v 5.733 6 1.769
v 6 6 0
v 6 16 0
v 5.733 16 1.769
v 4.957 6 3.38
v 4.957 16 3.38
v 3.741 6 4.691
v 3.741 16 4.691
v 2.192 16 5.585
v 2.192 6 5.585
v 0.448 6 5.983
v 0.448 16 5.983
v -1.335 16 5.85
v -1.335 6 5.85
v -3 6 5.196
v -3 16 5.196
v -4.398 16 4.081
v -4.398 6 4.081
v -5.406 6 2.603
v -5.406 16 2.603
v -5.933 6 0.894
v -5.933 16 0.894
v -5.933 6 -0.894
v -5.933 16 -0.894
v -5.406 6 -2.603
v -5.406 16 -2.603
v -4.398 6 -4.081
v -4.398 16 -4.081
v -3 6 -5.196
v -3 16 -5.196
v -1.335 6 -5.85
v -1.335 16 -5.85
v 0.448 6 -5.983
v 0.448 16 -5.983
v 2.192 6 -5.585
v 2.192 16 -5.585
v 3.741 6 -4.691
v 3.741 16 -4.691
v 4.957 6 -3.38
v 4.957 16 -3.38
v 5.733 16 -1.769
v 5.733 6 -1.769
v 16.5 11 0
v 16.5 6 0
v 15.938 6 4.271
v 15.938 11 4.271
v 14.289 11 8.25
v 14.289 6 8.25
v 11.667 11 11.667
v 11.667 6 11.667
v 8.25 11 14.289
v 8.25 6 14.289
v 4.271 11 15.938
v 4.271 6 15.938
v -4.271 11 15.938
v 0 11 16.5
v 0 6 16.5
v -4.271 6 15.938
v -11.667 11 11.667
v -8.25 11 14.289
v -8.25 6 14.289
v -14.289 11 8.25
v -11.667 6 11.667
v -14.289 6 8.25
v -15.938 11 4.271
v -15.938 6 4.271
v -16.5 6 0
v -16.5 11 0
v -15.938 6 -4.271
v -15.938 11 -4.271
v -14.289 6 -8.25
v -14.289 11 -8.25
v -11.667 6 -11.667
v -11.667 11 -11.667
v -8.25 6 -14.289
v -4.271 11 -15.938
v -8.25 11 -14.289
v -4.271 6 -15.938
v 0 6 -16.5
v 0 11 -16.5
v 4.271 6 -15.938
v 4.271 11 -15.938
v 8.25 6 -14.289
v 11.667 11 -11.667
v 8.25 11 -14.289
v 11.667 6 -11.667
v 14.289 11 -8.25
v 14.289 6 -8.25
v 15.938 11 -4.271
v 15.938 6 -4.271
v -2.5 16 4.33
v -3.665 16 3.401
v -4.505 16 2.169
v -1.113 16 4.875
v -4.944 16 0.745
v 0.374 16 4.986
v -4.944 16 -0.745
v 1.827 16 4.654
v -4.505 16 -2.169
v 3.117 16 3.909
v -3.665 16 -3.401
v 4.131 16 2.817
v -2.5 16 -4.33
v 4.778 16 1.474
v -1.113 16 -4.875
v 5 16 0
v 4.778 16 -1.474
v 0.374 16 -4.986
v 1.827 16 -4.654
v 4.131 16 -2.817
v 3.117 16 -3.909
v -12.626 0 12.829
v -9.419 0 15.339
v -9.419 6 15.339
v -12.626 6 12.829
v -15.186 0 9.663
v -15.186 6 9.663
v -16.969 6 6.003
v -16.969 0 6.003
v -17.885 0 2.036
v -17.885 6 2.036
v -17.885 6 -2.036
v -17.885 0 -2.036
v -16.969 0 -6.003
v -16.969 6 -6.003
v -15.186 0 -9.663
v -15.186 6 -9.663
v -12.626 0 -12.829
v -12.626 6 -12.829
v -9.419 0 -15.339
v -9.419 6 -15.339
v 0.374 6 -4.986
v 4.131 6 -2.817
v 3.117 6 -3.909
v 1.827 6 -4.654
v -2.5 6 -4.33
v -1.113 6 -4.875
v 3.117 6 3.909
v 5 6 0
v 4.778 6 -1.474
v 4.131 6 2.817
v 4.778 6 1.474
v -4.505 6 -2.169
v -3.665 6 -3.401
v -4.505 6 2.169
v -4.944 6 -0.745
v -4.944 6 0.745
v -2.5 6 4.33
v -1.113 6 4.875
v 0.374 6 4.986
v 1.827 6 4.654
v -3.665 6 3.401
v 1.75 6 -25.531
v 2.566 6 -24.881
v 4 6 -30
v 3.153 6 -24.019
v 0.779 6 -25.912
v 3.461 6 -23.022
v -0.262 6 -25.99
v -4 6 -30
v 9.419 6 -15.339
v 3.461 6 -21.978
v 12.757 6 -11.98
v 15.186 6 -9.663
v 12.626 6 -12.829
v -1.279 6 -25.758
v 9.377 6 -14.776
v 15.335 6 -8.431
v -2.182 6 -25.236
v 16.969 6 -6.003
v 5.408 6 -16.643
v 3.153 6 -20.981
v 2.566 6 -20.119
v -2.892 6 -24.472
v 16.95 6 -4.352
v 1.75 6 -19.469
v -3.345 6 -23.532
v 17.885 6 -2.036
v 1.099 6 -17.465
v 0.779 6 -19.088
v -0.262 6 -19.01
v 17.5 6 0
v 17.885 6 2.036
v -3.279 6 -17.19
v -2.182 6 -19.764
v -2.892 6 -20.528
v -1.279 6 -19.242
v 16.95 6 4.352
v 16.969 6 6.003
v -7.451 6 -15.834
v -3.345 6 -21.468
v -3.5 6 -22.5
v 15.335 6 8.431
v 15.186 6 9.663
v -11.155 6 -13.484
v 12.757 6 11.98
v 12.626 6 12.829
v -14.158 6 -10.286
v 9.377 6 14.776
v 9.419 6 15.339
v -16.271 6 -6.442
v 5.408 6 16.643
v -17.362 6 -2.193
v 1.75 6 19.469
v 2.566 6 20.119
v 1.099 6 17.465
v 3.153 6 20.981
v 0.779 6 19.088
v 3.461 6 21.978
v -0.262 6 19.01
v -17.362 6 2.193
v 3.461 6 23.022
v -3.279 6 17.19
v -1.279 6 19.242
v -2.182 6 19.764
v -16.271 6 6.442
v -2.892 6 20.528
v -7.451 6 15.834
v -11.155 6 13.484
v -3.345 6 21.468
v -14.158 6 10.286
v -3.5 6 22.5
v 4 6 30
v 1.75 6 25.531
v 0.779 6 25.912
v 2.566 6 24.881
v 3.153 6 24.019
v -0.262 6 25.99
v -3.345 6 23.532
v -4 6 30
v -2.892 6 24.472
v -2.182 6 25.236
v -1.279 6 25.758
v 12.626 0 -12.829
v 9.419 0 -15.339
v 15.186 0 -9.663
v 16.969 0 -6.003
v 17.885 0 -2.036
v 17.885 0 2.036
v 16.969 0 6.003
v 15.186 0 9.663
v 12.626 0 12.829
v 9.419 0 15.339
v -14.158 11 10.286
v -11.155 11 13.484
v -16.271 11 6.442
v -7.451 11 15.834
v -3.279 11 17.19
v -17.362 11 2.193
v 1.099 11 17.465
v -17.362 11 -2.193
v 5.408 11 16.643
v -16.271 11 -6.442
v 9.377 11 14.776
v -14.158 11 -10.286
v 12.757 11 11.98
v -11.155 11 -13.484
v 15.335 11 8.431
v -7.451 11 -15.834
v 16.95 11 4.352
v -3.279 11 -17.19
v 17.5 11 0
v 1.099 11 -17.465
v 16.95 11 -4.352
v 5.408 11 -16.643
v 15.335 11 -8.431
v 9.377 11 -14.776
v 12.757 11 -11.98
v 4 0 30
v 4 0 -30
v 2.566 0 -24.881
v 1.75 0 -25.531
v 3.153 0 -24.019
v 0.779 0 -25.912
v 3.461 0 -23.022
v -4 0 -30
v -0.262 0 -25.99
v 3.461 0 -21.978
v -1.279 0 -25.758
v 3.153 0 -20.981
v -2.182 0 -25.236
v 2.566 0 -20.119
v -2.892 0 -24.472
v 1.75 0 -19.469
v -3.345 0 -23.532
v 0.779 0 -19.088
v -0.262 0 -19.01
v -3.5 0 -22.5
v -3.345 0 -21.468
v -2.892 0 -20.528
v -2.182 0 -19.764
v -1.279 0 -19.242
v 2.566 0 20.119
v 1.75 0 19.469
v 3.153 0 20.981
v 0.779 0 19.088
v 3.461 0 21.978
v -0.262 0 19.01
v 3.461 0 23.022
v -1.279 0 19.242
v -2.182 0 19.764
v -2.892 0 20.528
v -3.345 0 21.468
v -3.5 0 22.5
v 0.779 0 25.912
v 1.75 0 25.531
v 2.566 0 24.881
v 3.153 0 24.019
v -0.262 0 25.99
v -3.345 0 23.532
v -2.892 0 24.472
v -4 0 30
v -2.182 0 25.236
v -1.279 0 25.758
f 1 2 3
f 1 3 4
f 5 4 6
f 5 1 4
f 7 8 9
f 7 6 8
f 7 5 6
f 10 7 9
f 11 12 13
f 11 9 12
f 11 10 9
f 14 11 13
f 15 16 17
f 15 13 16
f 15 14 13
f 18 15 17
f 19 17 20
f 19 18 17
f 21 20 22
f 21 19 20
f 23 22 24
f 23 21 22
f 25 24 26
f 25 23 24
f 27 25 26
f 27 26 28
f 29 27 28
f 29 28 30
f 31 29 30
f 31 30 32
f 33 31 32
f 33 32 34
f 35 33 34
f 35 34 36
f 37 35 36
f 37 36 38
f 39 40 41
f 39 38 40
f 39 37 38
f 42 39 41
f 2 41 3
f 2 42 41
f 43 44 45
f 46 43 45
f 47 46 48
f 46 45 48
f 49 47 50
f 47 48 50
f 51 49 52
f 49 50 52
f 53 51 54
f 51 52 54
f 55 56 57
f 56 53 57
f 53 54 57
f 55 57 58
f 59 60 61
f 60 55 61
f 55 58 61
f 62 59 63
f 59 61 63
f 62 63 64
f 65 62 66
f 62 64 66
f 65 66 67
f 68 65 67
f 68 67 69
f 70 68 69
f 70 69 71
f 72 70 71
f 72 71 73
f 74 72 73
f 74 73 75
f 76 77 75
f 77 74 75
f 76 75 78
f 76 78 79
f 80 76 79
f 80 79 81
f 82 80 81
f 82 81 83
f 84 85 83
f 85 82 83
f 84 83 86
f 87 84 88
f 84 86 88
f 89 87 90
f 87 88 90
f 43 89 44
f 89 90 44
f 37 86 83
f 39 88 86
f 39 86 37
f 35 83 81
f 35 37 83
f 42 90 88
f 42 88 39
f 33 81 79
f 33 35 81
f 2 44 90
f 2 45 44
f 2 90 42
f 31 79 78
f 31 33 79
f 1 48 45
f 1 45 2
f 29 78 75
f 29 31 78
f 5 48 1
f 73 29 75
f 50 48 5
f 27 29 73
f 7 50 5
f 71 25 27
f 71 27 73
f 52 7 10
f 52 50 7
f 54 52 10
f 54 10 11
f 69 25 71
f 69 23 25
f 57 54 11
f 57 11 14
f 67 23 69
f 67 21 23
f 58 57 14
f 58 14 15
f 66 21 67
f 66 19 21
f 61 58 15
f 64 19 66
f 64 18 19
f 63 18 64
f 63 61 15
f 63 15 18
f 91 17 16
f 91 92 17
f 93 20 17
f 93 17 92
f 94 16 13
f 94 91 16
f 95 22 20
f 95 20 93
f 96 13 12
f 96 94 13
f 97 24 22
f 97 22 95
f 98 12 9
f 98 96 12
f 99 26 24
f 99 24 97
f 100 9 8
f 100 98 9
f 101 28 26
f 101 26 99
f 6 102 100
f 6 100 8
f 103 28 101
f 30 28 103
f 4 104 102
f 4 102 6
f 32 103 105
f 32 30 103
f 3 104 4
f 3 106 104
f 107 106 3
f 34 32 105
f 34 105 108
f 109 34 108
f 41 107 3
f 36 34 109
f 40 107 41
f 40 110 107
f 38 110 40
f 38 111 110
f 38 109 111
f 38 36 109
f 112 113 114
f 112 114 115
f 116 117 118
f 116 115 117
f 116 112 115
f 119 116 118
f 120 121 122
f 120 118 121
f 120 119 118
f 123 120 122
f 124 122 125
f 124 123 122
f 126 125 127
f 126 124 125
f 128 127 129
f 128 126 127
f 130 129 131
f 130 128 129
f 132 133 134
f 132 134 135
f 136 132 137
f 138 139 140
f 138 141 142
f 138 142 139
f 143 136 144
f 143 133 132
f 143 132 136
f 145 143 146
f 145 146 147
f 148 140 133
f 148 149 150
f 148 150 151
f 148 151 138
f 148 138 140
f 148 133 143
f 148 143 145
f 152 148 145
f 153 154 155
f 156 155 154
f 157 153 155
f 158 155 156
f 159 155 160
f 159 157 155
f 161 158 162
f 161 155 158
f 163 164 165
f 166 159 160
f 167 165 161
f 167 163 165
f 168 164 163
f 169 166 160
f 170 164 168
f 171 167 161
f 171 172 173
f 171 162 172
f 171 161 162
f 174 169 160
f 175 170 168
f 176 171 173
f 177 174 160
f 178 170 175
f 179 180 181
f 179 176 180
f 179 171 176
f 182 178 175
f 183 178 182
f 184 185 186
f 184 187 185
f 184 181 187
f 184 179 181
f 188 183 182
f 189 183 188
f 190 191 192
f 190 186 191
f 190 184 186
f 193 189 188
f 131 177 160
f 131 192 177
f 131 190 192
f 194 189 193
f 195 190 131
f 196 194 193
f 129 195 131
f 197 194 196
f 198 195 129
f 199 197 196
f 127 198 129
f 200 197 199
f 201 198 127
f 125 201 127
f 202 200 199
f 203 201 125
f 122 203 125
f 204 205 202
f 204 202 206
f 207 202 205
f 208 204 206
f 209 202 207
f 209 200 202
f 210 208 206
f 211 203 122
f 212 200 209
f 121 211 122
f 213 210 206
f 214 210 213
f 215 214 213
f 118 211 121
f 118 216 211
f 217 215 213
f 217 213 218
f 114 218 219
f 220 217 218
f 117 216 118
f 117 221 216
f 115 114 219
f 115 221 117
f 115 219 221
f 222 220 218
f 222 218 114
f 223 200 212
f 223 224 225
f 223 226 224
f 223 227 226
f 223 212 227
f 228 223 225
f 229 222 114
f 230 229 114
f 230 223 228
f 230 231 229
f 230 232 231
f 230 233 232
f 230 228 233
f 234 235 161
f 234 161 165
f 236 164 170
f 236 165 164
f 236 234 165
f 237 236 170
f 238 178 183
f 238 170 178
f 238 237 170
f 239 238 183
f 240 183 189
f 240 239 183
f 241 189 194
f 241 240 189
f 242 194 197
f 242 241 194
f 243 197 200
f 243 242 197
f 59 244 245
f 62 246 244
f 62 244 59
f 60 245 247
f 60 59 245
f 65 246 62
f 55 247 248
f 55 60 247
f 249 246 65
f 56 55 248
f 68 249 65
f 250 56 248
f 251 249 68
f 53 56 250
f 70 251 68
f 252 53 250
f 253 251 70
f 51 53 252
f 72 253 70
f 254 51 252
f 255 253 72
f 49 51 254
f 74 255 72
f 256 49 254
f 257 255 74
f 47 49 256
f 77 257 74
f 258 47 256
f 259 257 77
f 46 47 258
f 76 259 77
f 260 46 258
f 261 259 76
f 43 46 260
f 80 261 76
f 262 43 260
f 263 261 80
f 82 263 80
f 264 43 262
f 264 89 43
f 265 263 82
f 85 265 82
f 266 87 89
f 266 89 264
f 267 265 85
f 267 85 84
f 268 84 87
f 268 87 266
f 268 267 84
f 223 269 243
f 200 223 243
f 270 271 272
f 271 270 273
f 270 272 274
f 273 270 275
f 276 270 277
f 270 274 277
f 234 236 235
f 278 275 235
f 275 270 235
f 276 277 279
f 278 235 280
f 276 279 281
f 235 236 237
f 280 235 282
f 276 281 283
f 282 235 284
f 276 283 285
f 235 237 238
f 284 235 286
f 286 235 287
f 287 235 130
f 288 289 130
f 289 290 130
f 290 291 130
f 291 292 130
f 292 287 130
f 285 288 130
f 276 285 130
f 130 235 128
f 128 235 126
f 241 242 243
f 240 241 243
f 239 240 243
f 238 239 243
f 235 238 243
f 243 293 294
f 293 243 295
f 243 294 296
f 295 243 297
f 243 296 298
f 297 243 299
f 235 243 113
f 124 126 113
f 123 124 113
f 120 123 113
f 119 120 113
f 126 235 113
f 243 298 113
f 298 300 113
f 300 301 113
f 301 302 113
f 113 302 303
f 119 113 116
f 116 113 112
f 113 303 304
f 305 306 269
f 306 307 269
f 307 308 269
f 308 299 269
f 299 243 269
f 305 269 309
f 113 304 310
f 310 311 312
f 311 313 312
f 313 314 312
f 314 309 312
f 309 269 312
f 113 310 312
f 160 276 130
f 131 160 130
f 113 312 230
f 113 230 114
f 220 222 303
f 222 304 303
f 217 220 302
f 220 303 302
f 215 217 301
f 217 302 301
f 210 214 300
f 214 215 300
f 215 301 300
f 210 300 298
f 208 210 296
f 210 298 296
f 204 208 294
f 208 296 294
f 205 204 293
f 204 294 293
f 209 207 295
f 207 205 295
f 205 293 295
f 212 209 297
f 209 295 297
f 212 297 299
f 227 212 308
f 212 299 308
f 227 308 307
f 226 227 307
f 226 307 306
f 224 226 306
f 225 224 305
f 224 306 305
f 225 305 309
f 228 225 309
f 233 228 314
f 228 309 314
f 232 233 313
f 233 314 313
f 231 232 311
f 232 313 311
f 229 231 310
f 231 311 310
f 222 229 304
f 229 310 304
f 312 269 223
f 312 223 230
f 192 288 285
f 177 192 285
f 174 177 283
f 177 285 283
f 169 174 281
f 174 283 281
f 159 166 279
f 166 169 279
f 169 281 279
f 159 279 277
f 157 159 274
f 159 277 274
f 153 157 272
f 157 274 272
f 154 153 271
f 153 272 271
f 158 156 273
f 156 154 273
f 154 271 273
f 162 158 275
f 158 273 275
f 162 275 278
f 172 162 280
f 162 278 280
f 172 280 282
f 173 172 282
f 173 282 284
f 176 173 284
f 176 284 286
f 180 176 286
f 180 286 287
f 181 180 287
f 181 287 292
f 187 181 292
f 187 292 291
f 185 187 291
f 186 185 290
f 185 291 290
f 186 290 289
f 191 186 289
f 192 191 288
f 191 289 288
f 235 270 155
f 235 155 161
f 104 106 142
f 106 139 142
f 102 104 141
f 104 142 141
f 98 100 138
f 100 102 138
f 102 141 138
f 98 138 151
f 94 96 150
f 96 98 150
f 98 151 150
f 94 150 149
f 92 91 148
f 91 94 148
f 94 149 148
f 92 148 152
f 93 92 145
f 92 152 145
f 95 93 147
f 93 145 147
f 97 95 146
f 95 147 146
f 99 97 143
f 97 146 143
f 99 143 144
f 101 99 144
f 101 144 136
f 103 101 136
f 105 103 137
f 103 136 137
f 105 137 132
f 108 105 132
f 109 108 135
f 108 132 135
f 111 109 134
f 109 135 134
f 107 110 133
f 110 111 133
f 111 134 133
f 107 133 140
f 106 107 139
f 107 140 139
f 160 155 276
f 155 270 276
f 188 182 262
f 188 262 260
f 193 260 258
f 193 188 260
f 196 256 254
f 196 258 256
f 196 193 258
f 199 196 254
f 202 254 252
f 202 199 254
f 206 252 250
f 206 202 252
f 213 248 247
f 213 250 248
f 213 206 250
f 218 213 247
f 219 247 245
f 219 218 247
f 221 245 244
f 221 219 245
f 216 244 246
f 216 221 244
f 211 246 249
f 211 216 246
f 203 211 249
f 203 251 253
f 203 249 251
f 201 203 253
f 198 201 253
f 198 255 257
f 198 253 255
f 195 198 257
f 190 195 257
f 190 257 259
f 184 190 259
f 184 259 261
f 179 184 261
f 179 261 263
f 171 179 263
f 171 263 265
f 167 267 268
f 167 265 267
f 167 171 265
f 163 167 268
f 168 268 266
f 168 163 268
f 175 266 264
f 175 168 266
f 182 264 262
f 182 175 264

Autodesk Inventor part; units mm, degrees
ref_plane "YZ Plane" through (0, 0, 0) normal (1, 0, 0) x (0, 1, 0)
ref_plane "XZ Plane" through (0, 0, 0) normal (0, 1, 0) x (-1, 0, 0)
sketch "Sketch1" plane through (0, 0, 0) normal (0, 1, 0) x (-1, 0, 0)
  circle A0 centre (0, 22.5) radius 3.5
  line L0 (0, 30) -> (4, 30)
  line L1 (4, 30) -> (9.4194, 15.3387)
  line L2 (0, 30) -> (-4, 30)
  line L3 (-4, 30) -> (-9.4194, 15.3387)
  circle A1 centre (0, -22.5) radius 3.5
  line L4 (0, -30) -> (4, -30)
  line L5 (4, -30) -> (9.4194, -15.3387)
  line L6 (0, -30) -> (-4, -30)
  line L7 (-4, -30) -> (-9.4194, -15.3387)
  arc A2 (-9.4194, 15.3387) -> (-9.4194, -15.3387) centre (0, 0) ccw
  arc A3 (9.4194, -15.3387) -> (9.4194, 15.3387) centre (0, 0) ccw
extrude "Extrusion1" add sketch "Sketch1" along normal blind 6
ref_plane "Work Plane1" through (0, 6, 0) normal (0, 1, 0) x (1, 0, 0)
sketch "Sketch2" plane through (0, 6, 0) normal (0, 1, 0) x (1, 0, 0)
  circle A0 centre (0, 0) radius 17.5
  circle A1 centre (0, 0) radius 16.5
  dimension "d9" = 35
  dimension "d12" = 33
extrude "Extrusion2" add sketch "Sketch2" along normal blind 5
sketch "Sketch3" plane through (0, 6, 0) normal (0, 1, 0) x (1, 0, 0)
  circle A0 centre (0, 0) radius 5
  circle A1 centre (0, 0) radius 6
  dimension "d15" = 10
  dimension "d16" = 12
extrude "Extrusion3" add sketch "Sketch3" along normal blind 10
properties part number "Chumacera con rodamiento 10 mm kfl000"
